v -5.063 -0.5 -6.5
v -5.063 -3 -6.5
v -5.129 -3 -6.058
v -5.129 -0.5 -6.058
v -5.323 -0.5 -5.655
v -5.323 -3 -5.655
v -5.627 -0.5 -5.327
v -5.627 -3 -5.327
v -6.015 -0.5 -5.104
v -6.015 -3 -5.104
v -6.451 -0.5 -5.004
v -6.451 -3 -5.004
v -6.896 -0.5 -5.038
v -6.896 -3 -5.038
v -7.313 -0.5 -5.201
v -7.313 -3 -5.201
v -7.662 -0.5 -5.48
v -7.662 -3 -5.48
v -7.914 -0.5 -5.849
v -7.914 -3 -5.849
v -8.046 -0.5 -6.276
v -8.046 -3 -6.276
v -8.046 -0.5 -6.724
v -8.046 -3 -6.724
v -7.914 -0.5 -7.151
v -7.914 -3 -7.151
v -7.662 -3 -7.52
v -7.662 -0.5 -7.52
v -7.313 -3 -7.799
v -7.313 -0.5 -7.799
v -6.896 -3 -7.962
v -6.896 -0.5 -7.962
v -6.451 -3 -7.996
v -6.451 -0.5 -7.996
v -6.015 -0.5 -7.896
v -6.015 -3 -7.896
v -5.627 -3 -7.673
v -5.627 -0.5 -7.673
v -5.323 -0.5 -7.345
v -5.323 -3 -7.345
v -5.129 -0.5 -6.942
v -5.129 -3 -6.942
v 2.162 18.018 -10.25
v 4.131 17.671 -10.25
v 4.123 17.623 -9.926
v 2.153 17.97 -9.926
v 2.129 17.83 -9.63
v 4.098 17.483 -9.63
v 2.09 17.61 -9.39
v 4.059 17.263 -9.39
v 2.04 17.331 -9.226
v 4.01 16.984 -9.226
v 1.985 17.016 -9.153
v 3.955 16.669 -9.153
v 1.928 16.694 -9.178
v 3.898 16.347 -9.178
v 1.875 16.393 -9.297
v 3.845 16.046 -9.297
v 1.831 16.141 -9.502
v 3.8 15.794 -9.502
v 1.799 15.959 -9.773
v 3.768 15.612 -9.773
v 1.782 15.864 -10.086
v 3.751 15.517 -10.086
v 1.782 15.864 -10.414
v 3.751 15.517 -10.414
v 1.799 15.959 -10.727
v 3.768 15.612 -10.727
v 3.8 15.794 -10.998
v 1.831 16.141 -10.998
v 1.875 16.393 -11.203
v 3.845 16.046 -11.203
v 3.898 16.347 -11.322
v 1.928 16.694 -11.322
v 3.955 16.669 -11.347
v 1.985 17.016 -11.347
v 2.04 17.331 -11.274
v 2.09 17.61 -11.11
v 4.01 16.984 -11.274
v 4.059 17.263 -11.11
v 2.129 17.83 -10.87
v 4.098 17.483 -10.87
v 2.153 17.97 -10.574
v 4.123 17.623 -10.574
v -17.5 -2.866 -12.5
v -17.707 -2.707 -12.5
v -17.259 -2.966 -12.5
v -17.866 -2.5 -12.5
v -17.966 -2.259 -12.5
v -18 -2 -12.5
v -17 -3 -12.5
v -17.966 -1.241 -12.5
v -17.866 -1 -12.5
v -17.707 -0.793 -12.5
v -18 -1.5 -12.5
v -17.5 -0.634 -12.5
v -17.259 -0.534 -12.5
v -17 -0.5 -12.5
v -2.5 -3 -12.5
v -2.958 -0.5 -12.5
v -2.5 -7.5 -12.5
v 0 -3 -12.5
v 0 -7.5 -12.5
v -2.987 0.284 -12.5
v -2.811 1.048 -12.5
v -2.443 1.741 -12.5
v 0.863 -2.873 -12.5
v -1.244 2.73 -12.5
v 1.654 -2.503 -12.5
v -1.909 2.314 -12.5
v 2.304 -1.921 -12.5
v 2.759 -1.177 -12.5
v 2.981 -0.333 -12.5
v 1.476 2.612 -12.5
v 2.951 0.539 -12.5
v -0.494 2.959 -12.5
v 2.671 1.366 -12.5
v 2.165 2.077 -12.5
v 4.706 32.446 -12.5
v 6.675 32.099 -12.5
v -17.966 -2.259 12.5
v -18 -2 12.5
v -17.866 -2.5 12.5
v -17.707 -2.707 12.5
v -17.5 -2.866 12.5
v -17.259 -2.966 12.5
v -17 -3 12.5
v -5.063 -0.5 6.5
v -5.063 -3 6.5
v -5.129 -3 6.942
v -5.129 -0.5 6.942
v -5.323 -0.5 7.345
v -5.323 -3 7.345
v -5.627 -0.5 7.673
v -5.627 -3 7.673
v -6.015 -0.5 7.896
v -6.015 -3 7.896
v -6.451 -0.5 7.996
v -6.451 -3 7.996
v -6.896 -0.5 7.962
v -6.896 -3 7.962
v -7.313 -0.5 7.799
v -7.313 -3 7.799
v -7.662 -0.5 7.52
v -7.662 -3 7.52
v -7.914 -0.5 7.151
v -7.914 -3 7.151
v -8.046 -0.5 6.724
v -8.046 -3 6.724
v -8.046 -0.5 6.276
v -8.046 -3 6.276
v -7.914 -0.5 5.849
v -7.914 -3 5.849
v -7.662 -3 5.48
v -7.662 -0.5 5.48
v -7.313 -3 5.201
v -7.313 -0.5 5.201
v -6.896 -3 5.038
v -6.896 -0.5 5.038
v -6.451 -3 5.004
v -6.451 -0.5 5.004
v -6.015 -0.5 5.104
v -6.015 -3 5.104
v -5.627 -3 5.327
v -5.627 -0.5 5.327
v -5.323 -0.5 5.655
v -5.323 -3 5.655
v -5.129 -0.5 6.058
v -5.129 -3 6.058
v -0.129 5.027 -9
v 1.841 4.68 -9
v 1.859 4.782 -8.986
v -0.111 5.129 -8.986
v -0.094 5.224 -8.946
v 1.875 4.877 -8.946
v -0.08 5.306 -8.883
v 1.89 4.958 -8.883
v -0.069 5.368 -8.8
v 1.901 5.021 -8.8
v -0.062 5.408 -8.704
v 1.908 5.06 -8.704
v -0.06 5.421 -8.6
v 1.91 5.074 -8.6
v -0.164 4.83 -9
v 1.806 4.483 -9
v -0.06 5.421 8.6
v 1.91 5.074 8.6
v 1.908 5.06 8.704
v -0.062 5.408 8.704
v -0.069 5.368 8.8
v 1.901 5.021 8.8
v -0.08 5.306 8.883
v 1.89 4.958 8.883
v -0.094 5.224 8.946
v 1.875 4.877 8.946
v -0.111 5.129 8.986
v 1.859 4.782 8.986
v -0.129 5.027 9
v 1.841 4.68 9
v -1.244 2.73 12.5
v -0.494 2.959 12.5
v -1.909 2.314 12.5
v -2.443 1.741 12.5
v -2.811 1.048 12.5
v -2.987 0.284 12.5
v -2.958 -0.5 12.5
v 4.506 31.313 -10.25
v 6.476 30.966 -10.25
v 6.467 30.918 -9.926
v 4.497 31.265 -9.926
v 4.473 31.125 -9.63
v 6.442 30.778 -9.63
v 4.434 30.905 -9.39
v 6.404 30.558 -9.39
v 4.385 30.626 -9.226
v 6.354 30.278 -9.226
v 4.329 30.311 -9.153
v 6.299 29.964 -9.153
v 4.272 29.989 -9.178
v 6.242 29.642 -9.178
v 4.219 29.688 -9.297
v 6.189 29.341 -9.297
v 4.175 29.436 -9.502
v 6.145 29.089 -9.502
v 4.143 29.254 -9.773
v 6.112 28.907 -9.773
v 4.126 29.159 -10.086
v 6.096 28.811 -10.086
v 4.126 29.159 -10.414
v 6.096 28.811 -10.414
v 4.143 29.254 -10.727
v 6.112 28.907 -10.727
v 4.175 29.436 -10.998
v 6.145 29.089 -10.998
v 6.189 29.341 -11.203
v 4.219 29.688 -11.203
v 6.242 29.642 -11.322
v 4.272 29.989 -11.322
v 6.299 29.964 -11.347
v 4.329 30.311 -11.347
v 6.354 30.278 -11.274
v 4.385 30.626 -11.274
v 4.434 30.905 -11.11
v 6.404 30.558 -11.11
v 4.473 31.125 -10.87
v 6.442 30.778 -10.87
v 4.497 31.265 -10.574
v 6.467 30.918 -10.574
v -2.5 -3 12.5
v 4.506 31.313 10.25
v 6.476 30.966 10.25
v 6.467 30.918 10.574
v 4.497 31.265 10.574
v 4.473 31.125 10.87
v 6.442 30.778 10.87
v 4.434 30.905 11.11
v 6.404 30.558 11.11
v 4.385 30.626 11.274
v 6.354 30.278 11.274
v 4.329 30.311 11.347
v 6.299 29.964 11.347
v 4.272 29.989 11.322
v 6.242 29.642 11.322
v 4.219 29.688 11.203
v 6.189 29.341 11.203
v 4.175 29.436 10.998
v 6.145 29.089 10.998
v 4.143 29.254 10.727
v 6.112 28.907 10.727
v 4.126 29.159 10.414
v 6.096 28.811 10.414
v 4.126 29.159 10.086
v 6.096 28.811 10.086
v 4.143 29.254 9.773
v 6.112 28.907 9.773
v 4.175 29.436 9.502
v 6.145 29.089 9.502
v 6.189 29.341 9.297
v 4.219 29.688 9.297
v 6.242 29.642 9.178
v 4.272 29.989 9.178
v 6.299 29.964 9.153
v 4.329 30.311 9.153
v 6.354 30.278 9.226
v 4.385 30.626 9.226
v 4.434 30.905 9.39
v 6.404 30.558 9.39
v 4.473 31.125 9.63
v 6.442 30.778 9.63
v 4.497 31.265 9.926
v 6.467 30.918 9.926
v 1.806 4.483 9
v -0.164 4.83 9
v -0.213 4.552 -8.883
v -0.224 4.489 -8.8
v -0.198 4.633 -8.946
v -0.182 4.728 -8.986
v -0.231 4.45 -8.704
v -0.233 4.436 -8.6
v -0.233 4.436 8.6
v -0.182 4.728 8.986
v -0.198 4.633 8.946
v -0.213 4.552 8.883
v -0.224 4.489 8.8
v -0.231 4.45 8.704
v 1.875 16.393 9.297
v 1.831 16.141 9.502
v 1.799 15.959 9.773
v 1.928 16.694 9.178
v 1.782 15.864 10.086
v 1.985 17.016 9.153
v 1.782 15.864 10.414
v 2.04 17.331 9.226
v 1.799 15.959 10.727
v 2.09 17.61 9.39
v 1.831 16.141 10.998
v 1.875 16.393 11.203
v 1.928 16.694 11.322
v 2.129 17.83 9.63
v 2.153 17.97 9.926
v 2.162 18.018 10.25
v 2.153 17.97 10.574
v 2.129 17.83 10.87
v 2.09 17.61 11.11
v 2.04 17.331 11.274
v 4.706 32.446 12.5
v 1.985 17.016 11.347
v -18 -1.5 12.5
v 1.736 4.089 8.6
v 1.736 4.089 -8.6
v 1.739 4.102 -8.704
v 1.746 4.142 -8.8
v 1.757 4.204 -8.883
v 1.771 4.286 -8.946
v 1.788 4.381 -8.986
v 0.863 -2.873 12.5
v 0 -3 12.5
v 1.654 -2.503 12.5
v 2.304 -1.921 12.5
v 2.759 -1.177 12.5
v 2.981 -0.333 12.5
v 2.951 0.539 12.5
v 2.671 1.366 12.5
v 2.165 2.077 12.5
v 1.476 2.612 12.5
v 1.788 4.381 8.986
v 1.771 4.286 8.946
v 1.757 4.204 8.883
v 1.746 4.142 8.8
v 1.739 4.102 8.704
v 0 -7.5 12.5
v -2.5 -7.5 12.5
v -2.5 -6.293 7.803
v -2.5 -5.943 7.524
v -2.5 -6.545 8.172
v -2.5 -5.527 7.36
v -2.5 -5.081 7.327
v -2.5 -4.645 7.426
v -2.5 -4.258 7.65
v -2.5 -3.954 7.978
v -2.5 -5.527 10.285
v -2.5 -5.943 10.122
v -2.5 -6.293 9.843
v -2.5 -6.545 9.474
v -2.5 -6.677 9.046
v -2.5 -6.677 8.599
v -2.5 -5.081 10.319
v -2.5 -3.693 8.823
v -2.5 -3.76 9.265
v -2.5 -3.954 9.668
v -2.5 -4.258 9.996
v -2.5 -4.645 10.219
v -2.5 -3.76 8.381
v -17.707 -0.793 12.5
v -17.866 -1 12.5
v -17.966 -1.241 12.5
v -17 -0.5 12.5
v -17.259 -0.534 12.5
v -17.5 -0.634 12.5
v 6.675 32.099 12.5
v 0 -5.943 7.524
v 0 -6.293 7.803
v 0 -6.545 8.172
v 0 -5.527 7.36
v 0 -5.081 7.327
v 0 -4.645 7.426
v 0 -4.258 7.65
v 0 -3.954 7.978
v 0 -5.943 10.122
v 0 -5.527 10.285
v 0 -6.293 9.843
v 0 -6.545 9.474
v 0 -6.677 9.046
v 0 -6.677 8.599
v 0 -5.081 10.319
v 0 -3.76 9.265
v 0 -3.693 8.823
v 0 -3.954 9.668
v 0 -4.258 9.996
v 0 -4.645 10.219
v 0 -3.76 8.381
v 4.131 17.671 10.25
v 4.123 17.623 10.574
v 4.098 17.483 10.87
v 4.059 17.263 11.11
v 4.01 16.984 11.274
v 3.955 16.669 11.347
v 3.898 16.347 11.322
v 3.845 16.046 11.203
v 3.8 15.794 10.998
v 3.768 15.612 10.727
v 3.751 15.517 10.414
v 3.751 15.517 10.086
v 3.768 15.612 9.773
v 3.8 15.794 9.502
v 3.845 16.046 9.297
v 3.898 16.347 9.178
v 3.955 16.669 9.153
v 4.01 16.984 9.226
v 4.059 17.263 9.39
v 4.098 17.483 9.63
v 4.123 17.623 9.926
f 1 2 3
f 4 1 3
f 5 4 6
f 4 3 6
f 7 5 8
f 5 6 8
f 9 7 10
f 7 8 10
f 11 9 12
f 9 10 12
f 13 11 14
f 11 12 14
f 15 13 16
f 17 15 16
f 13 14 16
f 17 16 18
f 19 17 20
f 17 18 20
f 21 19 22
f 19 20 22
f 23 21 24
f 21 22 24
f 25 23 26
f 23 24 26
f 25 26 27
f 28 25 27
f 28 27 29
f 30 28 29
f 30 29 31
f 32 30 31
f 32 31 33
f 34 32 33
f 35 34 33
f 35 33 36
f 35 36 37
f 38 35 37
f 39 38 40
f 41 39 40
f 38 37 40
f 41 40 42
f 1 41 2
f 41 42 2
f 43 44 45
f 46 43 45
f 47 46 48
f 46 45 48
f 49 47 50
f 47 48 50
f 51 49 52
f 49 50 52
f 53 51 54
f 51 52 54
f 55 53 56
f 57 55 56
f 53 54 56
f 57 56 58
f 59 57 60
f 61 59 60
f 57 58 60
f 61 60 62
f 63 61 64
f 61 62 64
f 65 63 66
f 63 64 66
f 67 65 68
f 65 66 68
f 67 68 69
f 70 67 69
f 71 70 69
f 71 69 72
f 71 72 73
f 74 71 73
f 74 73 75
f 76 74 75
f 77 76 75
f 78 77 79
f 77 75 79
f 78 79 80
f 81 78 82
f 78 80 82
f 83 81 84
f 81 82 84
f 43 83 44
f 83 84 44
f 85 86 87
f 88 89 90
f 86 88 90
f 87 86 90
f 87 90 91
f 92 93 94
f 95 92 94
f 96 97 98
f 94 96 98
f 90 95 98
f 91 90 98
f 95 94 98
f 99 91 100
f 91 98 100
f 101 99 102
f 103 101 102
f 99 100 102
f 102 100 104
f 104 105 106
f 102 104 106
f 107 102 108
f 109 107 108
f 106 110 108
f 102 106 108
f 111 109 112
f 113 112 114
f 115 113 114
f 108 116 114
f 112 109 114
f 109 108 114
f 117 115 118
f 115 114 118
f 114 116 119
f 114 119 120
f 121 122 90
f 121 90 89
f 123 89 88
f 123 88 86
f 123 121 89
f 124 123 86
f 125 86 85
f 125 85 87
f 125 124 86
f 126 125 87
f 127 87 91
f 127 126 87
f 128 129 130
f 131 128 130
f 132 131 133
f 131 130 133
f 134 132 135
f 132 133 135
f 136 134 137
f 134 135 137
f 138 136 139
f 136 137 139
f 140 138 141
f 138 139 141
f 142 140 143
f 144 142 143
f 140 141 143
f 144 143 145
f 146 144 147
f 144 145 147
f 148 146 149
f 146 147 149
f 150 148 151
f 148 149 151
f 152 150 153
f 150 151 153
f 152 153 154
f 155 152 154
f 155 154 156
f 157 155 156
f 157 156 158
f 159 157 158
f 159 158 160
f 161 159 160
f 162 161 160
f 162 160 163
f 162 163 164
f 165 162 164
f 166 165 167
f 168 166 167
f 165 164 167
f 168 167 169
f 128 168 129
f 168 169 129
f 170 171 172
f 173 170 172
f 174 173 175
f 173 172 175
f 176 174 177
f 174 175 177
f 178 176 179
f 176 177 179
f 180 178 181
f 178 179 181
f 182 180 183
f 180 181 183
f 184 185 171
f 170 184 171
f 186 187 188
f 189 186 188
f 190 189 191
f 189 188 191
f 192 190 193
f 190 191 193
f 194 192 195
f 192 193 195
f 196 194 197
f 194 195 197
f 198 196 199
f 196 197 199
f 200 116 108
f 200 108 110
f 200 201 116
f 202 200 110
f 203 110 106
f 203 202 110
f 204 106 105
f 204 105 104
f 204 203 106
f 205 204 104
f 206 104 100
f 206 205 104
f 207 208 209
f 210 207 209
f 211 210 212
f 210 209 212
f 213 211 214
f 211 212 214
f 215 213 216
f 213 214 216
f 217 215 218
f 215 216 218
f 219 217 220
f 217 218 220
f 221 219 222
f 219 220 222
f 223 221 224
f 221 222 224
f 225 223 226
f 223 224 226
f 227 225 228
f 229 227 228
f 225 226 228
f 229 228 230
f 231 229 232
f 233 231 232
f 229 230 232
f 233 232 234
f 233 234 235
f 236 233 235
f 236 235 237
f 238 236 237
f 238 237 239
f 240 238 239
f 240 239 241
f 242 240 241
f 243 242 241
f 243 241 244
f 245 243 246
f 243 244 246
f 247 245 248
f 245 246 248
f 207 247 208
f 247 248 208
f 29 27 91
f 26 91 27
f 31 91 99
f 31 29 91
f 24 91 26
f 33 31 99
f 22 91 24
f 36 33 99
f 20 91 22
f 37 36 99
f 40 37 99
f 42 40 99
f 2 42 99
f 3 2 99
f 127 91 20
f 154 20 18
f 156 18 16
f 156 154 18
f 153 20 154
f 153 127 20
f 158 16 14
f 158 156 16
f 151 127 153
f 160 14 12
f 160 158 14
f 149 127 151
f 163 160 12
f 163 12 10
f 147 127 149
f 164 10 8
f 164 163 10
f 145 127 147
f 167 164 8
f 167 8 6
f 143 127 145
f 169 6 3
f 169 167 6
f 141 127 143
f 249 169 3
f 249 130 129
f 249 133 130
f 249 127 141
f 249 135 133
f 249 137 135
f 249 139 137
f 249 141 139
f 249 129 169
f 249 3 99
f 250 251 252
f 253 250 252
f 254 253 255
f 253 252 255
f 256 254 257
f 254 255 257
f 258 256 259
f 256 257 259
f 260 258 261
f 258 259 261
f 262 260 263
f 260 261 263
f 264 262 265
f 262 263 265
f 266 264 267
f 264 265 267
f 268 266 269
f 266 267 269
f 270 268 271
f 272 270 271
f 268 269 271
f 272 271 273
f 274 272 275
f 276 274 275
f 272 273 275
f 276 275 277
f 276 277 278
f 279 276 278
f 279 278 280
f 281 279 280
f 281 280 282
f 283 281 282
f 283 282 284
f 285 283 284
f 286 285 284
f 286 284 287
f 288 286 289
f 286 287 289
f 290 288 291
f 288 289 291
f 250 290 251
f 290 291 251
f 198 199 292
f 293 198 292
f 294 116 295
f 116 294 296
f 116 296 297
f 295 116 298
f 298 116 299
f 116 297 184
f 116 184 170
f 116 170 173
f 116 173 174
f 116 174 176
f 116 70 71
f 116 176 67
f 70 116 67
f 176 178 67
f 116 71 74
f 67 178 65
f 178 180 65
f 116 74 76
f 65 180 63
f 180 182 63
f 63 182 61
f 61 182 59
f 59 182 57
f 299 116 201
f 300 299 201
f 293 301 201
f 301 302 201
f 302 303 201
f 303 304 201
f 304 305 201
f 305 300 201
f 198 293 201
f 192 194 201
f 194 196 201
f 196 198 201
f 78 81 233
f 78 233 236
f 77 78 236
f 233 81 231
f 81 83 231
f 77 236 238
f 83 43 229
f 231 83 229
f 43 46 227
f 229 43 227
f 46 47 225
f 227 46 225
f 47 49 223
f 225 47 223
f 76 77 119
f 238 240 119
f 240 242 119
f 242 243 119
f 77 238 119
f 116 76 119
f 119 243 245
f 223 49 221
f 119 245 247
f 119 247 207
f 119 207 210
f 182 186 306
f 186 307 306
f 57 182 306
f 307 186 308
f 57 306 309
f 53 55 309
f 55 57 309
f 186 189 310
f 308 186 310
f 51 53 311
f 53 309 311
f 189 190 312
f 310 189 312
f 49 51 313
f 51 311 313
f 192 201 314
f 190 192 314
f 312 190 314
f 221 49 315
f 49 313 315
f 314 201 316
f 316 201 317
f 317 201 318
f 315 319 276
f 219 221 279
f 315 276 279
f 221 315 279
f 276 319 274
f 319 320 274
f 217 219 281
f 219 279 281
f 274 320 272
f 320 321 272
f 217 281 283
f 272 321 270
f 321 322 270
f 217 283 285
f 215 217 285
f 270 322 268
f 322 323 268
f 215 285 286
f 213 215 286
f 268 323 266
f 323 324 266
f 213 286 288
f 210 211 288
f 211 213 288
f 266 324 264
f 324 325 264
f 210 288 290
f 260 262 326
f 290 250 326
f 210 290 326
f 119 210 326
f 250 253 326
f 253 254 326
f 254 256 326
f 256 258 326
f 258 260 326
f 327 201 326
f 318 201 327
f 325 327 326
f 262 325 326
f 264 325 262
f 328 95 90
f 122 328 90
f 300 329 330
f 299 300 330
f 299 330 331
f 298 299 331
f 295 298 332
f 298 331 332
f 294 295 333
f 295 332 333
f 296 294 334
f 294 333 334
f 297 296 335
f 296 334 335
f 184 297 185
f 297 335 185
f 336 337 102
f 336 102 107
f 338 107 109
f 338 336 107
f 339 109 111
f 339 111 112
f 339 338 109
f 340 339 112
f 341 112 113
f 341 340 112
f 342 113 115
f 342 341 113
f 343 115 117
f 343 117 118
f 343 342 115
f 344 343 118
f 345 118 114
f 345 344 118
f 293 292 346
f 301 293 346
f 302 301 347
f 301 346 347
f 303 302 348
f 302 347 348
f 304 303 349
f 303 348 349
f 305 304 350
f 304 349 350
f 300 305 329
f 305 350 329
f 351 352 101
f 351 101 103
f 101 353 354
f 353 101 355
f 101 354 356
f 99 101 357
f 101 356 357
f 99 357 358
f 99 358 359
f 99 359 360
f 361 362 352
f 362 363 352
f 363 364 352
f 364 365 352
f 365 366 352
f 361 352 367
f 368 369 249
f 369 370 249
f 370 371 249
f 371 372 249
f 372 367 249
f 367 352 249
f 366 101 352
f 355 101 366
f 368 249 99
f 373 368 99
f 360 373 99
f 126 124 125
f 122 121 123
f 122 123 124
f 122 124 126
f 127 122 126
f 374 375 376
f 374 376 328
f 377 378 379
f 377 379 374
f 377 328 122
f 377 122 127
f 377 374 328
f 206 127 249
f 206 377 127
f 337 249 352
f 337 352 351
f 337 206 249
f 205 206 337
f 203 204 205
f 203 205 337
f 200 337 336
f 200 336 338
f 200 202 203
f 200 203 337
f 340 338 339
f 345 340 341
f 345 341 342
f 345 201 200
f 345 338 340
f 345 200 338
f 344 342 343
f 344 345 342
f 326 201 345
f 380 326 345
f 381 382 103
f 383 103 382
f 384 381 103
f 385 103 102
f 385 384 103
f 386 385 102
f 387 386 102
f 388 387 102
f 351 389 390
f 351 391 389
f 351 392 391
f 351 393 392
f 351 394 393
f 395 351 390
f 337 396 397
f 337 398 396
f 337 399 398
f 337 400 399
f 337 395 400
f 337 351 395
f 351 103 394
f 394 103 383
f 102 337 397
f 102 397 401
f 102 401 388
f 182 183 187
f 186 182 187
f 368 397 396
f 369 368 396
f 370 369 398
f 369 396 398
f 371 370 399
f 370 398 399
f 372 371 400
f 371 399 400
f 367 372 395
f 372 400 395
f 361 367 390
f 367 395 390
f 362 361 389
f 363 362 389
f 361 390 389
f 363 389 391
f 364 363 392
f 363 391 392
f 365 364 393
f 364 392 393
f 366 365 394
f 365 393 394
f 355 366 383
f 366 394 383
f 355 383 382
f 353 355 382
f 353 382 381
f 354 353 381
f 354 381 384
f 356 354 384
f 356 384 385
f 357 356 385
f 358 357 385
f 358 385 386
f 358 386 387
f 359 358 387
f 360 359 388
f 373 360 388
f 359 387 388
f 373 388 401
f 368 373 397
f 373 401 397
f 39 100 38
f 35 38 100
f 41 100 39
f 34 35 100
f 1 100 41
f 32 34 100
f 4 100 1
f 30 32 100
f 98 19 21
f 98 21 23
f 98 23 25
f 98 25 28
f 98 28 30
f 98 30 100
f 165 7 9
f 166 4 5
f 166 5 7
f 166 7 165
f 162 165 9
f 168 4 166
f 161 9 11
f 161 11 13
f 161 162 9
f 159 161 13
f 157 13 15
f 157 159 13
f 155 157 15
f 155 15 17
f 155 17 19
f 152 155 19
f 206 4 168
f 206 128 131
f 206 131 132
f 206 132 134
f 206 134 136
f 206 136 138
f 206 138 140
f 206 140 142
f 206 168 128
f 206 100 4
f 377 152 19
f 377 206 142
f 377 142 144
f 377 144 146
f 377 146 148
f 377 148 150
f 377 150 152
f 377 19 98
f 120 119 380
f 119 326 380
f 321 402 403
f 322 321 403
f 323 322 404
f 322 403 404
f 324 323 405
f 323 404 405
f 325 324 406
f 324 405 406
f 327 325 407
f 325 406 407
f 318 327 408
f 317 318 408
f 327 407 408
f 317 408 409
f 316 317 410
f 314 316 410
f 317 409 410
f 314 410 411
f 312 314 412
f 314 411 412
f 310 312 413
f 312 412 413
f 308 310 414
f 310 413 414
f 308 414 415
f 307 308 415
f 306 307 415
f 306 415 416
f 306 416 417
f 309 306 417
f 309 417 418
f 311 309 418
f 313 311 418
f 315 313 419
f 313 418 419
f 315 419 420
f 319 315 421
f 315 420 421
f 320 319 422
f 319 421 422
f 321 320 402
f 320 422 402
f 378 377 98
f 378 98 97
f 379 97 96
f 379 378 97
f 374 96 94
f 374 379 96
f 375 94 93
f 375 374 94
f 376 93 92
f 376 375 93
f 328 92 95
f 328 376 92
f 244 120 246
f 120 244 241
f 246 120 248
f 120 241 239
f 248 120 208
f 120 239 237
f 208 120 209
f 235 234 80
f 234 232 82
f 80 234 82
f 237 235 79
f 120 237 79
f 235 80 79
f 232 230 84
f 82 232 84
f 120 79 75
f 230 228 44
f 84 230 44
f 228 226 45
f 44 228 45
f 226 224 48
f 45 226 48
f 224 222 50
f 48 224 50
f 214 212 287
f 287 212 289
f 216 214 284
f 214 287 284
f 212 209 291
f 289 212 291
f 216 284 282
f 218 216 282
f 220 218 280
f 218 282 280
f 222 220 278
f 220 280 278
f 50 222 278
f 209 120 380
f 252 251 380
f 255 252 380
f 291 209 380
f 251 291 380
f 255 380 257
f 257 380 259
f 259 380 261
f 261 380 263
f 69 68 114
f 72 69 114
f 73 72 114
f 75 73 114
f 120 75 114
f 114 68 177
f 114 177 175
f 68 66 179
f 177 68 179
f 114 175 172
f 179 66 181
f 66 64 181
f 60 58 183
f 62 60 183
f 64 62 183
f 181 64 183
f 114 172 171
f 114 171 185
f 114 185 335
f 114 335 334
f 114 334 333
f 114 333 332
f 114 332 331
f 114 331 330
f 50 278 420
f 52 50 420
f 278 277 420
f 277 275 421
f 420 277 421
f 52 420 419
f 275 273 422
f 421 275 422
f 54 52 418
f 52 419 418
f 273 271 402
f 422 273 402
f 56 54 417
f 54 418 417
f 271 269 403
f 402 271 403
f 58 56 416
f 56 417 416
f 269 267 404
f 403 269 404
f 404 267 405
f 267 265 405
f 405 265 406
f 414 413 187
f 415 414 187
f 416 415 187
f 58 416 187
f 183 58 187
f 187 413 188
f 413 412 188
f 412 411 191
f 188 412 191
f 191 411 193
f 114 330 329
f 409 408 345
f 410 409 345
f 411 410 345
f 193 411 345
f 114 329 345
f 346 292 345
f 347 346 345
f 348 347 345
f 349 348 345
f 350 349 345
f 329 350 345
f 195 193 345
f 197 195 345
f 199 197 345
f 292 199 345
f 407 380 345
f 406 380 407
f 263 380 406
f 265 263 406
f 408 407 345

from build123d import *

# Parameters (mm, degrees)
SKETCH1_R           = 3
BOSS_EXTRUDE2_DEPTH = 12.5
CUT_EXTRUDE1_DEPTH  = 2
SKETCH4_R           = 1.5
CUT_EXTRUDE4_DEPTH  = 2.5
SKETCH5_W           = 2.5
SKETCH5_H           = 4.5
BOSS_EXTRUDE3_DEPTH = 25
SKETCH6_R           = 1.500002847
CUT_EXTRUDE5_DEPTH  = 2.5
SKETCH7_R           = 1.1
CUT_EXTRUDE6_DEPTH  = 2


with BuildPart() as part:
    # Sketch1 → Boss-Extrude2 (new, symmetric)
    with BuildSketch(Plane.XY):
        Circle(SKETCH1_R)
        with BuildLine():
            Line((0, -3), (0, -0.5))
            Line((0, -0.5), (-17, -0.5))
            ThreePointArc((-17, -0.5), (-17.707106781, -0.792893219), (-18, -1.5))
            Line((-18, -1.5), (-18, -2))
            ThreePointArc((-18, -2), (-17.707106781, -2.707106781), (-17, -3))
            Line((-17, -3), (0, -3))
        make_face()
        Polygon((6.675258535, 32.098501889), (0.984807753, -0.173648178), (-0.984807753, 0.173648178), (4.705643029, 32.445798244), align=None)
    extrude(amount=BOSS_EXTRUDE2_DEPTH, both=True)

    # Sketch2 → Cut-Extrude1 (cut)
    with BuildSketch(Plane(origin=(0.9848077530122124, -0.17364817766692678, 0), x_dir=(0, 0, -1), z_dir=(0.9848077530122088, -0.17364817766692617, 0))):
        with BuildLine():
            Line((-8.6, 4.328427125), (8.6, 4.328427125))
            ThreePointArc((8.6, 4.328427125), (8.882842712, 4.445584412), (9, 4.728427125))
            Line((9, 4.728427125), (9, 4.928427125))
            ThreePointArc((9, 4.928427125), (8.882842712, 5.211269837), (8.6, 5.328427125))
            Line((8.6, 5.328427125), (-8.6, 5.328427125))
            ThreePointArc((-8.6, 5.328427125), (-8.882842712, 5.211269837), (-9, 4.928427125))
            Line((-9, 4.928427125), (-9, 4.728427125))
            ThreePointArc((-9, 4.728427125), (-8.882842712, 4.445584412), (-8.6, 4.328427125))
        make_face()
    extrude(amount=-CUT_EXTRUDE1_DEPTH, mode=Mode.SUBTRACT)

    # Sketch4 → Cut-Extrude4 (cut)
    with BuildSketch(Plane.XZ.offset(3)):
        with Locations((-6.562669804, 6.5)):
            Circle(SKETCH4_R)
        with Locations((-6.562669804, -6.5)):
            Circle(SKETCH4_R)
    extrude(amount=-CUT_EXTRUDE4_DEPTH, mode=Mode.SUBTRACT)

    # Sketch5 → Boss-Extrude3 (add)
    with BuildSketch(Plane.XY.offset(12.5)):
        with Locations((-1.25, -5.25)):
            Rectangle(SKETCH5_W, SKETCH5_H)
    extrude(amount=-BOSS_EXTRUDE3_DEPTH)

    # Sketch6 → Cut-Extrude5 (cut)
    with BuildSketch(Plane(origin=(0, 0, 0), x_dir=(0, 0, -1), z_dir=(1, 0, 0))):
        with Locations(Location((-8.822806399, -5.193294881, 0), (0, 0, 90))):
            Circle(SKETCH6_R)
    extrude(amount=-CUT_EXTRUDE5_DEPTH, mode=Mode.SUBTRACT)

    # Sketch7 → Cut-Extrude6 (cut)
    with BuildSketch(Plane(origin=(0.9848077530122124, -0.17364817766692678, 0), x_dir=(0, 0, -1), z_dir=(0.9848077530122088, -0.17364817766692617, 0))):
        with Locations(Location((-10.25, 30.52, 0), (0, 0, 90))):
            Circle(SKETCH7_R)
        with Locations(Location((-10.25, 17.02, 0), (0, 0, 90))):
            Circle(SKETCH7_R)
        with Locations(Location((10.25, 17.02, 0), (0, 0, 90))):
            Circle(SKETCH7_R)
        with Locations(Location((10.25, 30.52, 0), (0, 0, 90))):
            Circle(SKETCH7_R)
    extrude(amount=-CUT_EXTRUDE6_DEPTH, mode=Mode.SUBTRACT)


solid = part.part
